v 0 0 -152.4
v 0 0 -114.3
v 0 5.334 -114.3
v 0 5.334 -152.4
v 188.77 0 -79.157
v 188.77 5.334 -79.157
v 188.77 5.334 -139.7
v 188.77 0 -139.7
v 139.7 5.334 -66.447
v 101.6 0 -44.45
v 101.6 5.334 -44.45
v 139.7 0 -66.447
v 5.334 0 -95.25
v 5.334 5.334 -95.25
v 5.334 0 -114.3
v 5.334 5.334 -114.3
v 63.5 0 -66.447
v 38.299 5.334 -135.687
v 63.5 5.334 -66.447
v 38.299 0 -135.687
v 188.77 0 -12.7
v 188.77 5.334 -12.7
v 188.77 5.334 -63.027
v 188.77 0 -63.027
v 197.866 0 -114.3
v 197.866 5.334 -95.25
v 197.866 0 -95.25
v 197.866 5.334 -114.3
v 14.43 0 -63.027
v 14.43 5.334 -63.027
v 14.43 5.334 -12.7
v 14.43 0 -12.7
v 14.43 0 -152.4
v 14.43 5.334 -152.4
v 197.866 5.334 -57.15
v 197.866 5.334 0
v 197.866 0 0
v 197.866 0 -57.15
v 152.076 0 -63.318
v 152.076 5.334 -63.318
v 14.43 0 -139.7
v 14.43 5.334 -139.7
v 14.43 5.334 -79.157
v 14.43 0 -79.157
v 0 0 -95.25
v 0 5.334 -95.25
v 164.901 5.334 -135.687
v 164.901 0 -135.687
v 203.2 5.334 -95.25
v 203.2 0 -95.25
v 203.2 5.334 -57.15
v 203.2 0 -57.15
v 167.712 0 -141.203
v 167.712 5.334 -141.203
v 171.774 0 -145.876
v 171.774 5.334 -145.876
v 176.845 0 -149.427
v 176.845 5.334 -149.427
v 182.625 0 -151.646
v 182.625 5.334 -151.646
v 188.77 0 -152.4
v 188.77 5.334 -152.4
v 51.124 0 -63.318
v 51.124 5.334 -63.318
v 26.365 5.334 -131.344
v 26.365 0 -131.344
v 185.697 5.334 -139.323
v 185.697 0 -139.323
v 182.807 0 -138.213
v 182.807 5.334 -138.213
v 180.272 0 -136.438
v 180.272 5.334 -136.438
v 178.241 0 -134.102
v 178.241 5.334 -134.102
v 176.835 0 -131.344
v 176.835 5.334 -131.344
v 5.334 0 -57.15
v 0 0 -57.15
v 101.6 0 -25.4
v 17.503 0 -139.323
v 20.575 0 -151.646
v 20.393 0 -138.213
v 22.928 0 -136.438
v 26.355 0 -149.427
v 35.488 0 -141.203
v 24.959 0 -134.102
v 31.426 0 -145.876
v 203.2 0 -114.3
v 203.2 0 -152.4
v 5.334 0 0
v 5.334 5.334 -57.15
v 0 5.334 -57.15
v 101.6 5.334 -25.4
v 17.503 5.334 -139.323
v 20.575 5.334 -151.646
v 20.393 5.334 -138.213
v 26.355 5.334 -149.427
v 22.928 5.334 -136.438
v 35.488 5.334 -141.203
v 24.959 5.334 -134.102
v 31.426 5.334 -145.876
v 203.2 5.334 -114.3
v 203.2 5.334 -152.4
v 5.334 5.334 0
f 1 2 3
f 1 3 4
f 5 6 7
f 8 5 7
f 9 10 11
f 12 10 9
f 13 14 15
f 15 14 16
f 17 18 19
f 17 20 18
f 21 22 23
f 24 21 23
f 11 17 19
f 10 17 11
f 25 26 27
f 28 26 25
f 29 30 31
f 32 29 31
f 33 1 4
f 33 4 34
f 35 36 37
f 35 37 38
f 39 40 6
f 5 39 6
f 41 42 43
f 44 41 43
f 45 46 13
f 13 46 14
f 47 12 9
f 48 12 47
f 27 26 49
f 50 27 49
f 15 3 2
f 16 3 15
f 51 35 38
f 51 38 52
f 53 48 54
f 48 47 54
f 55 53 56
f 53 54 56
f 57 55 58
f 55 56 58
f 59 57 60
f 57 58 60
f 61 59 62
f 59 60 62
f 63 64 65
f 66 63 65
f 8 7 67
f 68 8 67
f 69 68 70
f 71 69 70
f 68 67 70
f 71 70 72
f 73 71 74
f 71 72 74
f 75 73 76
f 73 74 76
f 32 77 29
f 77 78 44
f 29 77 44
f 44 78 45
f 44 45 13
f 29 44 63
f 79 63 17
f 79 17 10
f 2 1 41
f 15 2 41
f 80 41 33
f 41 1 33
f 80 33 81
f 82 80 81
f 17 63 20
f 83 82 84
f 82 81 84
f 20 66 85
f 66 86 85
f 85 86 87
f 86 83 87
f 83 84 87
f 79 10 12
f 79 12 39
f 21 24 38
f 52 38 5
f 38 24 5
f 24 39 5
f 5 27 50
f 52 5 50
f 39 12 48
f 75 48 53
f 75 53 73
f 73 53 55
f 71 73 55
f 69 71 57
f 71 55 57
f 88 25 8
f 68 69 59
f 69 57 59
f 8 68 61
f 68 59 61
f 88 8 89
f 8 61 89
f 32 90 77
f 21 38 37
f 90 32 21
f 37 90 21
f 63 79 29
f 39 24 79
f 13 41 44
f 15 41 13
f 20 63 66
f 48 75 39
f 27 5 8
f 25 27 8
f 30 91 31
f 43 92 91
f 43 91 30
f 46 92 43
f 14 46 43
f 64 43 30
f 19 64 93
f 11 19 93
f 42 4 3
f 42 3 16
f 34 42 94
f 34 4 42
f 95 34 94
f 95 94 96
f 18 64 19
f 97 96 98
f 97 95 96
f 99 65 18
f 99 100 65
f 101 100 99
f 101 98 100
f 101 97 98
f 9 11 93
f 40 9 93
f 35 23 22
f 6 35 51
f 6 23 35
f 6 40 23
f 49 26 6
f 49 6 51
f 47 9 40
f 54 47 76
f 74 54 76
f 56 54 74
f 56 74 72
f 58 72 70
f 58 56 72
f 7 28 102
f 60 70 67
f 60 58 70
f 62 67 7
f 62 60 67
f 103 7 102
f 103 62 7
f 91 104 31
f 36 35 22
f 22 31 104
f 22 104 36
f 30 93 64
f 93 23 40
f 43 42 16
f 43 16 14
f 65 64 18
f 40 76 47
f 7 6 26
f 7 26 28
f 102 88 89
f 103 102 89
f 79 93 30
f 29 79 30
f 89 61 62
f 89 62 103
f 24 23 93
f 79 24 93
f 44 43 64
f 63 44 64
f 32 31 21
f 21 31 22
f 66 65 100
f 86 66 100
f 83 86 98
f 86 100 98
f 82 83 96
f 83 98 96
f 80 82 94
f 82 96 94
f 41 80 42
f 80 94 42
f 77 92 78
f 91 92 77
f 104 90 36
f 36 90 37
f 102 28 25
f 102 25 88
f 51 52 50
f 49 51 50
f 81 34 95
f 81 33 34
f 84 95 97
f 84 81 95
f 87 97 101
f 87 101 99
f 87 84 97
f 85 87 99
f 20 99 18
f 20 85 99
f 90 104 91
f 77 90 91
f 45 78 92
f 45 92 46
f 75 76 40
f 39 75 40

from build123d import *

# Parameters (mm, degrees)
SKETCH1_W              = 203.2
SKETCH1_H              = 152.4
BASE_DEPTH             = 5.334
CENTER_CUT_DEPTH       = 255.056000827
CENTER_CUT_DEPTH_BACK  = 255.056000827
SKETCH4_W              = 5.334
SKETCH4_H              = 19.05
SKETCH4_H_2            = 57.15
SLOTS_DEPTH            = 255.056000827
LEADING_EDGE_FILLET_R  = 25.4
WEIGHT_REDUCTION_DEPTH = 255.056000827


with BuildPart() as part:
    # Sketch1 → Base (new body)
    with BuildSketch(Plane(origin=(0, 0, 0), x_dir=(1, 0, 0), z_dir=(0, 1, 0))):
        with Locations((101.6, 76.2)):
            Rectangle(SKETCH1_W, SKETCH1_H)
    extrude(amount=BASE_DEPTH)

    # Sketch2 → Center Cut (cut, two sides: drawn at the far end of the back side and taken through both)
    with BuildSketch(Plane(origin=(0, 5.334, 0), x_dir=(1, 0, 0), z_dir=(0, 1, 0)).offset(-CENTER_CUT_DEPTH_BACK)):
        Polygon((-127.880204408, 592.259835398), (32.215682926, 152.4), (63.5, 66.447045256), (101.6, 44.45), (139.7, 66.447045256), (170.984317074, 152.4), (331.080204408, 592.259835398), (331.080204408, 1528.437955069), (-127.880204408, 1528.437955069), align=None)
    extrude(amount=CENTER_CUT_DEPTH + CENTER_CUT_DEPTH_BACK, mode=Mode.SUBTRACT)

    # Sketch4 → Slots (cut, through all)
    with BuildSketch(Plane(origin=(0, 5.334, 0), x_dir=(1, 0, 0), z_dir=(0, 1, 0))):
        with Locations((2.667, 104.775)):
            Rectangle(SKETCH4_W, SKETCH4_H)
        with Locations((200.533, 28.575)):
            Rectangle(SKETCH4_W, SKETCH4_H_2)
        with Locations((2.667, 28.575)):
            Rectangle(SKETCH4_W, SKETCH4_H_2)
        with Locations((200.533, 104.775)):
            Rectangle(SKETCH4_W, SKETCH4_H)
    extrude(amount=-SLOTS_DEPTH, mode=Mode.SUBTRACT)

    # Leading Edge Fillet
    leading_edge_fillet_edges = [part.edges().sort_by_distance(p)[0] for p in [
        (170.984317074, 2.667, -152.4),
        (32.215682926, 2.667, -152.4),
    ]]
    fillet(leading_edge_fillet_edges, radius=LEADING_EDGE_FILLET_R)

    # Sketch5 → Weight Reduction (cut, through all)
    with BuildSketch(Plane(origin=(0, 5.334, 0), x_dir=(1, 0, 0), z_dir=(0, 1, 0))):
        Polygon((14.430411455, 12.7), (188.769588545, 12.7), (188.769588545, 63.027385411), (101.6, 25.4), (14.430411455, 63.027385411), align=None)
        with BuildLine():
            Line((14.430411455, 139.7), (14.430411455, 79.156722924))
            Line((14.430411455, 79.156722924), (51.123931231, 63.31769886))
            Line((51.123931231, 63.31769886), (26.364507739, 131.34365582))
            ThreePointArc((26.364507739, 131.34365582), (21.714832197, 137.403230962), (14.430411455, 139.7))
        make_face()
        with BuildLine():
            Line((176.835492261, 131.34365582), (152.076068769, 63.31769886))
            Line((152.076068769, 63.31769886), (188.769588545, 79.156722924))
            Line((188.769588545, 79.156722924), (188.769588545, 139.7))
            ThreePointArc((188.769588545, 139.7), (181.485167803, 137.403230962), (176.835492261, 131.34365582))
        make_face()
    extrude(amount=-WEIGHT_REDUCTION_DEPTH, mode=Mode.SUBTRACT)


solid = part.part
